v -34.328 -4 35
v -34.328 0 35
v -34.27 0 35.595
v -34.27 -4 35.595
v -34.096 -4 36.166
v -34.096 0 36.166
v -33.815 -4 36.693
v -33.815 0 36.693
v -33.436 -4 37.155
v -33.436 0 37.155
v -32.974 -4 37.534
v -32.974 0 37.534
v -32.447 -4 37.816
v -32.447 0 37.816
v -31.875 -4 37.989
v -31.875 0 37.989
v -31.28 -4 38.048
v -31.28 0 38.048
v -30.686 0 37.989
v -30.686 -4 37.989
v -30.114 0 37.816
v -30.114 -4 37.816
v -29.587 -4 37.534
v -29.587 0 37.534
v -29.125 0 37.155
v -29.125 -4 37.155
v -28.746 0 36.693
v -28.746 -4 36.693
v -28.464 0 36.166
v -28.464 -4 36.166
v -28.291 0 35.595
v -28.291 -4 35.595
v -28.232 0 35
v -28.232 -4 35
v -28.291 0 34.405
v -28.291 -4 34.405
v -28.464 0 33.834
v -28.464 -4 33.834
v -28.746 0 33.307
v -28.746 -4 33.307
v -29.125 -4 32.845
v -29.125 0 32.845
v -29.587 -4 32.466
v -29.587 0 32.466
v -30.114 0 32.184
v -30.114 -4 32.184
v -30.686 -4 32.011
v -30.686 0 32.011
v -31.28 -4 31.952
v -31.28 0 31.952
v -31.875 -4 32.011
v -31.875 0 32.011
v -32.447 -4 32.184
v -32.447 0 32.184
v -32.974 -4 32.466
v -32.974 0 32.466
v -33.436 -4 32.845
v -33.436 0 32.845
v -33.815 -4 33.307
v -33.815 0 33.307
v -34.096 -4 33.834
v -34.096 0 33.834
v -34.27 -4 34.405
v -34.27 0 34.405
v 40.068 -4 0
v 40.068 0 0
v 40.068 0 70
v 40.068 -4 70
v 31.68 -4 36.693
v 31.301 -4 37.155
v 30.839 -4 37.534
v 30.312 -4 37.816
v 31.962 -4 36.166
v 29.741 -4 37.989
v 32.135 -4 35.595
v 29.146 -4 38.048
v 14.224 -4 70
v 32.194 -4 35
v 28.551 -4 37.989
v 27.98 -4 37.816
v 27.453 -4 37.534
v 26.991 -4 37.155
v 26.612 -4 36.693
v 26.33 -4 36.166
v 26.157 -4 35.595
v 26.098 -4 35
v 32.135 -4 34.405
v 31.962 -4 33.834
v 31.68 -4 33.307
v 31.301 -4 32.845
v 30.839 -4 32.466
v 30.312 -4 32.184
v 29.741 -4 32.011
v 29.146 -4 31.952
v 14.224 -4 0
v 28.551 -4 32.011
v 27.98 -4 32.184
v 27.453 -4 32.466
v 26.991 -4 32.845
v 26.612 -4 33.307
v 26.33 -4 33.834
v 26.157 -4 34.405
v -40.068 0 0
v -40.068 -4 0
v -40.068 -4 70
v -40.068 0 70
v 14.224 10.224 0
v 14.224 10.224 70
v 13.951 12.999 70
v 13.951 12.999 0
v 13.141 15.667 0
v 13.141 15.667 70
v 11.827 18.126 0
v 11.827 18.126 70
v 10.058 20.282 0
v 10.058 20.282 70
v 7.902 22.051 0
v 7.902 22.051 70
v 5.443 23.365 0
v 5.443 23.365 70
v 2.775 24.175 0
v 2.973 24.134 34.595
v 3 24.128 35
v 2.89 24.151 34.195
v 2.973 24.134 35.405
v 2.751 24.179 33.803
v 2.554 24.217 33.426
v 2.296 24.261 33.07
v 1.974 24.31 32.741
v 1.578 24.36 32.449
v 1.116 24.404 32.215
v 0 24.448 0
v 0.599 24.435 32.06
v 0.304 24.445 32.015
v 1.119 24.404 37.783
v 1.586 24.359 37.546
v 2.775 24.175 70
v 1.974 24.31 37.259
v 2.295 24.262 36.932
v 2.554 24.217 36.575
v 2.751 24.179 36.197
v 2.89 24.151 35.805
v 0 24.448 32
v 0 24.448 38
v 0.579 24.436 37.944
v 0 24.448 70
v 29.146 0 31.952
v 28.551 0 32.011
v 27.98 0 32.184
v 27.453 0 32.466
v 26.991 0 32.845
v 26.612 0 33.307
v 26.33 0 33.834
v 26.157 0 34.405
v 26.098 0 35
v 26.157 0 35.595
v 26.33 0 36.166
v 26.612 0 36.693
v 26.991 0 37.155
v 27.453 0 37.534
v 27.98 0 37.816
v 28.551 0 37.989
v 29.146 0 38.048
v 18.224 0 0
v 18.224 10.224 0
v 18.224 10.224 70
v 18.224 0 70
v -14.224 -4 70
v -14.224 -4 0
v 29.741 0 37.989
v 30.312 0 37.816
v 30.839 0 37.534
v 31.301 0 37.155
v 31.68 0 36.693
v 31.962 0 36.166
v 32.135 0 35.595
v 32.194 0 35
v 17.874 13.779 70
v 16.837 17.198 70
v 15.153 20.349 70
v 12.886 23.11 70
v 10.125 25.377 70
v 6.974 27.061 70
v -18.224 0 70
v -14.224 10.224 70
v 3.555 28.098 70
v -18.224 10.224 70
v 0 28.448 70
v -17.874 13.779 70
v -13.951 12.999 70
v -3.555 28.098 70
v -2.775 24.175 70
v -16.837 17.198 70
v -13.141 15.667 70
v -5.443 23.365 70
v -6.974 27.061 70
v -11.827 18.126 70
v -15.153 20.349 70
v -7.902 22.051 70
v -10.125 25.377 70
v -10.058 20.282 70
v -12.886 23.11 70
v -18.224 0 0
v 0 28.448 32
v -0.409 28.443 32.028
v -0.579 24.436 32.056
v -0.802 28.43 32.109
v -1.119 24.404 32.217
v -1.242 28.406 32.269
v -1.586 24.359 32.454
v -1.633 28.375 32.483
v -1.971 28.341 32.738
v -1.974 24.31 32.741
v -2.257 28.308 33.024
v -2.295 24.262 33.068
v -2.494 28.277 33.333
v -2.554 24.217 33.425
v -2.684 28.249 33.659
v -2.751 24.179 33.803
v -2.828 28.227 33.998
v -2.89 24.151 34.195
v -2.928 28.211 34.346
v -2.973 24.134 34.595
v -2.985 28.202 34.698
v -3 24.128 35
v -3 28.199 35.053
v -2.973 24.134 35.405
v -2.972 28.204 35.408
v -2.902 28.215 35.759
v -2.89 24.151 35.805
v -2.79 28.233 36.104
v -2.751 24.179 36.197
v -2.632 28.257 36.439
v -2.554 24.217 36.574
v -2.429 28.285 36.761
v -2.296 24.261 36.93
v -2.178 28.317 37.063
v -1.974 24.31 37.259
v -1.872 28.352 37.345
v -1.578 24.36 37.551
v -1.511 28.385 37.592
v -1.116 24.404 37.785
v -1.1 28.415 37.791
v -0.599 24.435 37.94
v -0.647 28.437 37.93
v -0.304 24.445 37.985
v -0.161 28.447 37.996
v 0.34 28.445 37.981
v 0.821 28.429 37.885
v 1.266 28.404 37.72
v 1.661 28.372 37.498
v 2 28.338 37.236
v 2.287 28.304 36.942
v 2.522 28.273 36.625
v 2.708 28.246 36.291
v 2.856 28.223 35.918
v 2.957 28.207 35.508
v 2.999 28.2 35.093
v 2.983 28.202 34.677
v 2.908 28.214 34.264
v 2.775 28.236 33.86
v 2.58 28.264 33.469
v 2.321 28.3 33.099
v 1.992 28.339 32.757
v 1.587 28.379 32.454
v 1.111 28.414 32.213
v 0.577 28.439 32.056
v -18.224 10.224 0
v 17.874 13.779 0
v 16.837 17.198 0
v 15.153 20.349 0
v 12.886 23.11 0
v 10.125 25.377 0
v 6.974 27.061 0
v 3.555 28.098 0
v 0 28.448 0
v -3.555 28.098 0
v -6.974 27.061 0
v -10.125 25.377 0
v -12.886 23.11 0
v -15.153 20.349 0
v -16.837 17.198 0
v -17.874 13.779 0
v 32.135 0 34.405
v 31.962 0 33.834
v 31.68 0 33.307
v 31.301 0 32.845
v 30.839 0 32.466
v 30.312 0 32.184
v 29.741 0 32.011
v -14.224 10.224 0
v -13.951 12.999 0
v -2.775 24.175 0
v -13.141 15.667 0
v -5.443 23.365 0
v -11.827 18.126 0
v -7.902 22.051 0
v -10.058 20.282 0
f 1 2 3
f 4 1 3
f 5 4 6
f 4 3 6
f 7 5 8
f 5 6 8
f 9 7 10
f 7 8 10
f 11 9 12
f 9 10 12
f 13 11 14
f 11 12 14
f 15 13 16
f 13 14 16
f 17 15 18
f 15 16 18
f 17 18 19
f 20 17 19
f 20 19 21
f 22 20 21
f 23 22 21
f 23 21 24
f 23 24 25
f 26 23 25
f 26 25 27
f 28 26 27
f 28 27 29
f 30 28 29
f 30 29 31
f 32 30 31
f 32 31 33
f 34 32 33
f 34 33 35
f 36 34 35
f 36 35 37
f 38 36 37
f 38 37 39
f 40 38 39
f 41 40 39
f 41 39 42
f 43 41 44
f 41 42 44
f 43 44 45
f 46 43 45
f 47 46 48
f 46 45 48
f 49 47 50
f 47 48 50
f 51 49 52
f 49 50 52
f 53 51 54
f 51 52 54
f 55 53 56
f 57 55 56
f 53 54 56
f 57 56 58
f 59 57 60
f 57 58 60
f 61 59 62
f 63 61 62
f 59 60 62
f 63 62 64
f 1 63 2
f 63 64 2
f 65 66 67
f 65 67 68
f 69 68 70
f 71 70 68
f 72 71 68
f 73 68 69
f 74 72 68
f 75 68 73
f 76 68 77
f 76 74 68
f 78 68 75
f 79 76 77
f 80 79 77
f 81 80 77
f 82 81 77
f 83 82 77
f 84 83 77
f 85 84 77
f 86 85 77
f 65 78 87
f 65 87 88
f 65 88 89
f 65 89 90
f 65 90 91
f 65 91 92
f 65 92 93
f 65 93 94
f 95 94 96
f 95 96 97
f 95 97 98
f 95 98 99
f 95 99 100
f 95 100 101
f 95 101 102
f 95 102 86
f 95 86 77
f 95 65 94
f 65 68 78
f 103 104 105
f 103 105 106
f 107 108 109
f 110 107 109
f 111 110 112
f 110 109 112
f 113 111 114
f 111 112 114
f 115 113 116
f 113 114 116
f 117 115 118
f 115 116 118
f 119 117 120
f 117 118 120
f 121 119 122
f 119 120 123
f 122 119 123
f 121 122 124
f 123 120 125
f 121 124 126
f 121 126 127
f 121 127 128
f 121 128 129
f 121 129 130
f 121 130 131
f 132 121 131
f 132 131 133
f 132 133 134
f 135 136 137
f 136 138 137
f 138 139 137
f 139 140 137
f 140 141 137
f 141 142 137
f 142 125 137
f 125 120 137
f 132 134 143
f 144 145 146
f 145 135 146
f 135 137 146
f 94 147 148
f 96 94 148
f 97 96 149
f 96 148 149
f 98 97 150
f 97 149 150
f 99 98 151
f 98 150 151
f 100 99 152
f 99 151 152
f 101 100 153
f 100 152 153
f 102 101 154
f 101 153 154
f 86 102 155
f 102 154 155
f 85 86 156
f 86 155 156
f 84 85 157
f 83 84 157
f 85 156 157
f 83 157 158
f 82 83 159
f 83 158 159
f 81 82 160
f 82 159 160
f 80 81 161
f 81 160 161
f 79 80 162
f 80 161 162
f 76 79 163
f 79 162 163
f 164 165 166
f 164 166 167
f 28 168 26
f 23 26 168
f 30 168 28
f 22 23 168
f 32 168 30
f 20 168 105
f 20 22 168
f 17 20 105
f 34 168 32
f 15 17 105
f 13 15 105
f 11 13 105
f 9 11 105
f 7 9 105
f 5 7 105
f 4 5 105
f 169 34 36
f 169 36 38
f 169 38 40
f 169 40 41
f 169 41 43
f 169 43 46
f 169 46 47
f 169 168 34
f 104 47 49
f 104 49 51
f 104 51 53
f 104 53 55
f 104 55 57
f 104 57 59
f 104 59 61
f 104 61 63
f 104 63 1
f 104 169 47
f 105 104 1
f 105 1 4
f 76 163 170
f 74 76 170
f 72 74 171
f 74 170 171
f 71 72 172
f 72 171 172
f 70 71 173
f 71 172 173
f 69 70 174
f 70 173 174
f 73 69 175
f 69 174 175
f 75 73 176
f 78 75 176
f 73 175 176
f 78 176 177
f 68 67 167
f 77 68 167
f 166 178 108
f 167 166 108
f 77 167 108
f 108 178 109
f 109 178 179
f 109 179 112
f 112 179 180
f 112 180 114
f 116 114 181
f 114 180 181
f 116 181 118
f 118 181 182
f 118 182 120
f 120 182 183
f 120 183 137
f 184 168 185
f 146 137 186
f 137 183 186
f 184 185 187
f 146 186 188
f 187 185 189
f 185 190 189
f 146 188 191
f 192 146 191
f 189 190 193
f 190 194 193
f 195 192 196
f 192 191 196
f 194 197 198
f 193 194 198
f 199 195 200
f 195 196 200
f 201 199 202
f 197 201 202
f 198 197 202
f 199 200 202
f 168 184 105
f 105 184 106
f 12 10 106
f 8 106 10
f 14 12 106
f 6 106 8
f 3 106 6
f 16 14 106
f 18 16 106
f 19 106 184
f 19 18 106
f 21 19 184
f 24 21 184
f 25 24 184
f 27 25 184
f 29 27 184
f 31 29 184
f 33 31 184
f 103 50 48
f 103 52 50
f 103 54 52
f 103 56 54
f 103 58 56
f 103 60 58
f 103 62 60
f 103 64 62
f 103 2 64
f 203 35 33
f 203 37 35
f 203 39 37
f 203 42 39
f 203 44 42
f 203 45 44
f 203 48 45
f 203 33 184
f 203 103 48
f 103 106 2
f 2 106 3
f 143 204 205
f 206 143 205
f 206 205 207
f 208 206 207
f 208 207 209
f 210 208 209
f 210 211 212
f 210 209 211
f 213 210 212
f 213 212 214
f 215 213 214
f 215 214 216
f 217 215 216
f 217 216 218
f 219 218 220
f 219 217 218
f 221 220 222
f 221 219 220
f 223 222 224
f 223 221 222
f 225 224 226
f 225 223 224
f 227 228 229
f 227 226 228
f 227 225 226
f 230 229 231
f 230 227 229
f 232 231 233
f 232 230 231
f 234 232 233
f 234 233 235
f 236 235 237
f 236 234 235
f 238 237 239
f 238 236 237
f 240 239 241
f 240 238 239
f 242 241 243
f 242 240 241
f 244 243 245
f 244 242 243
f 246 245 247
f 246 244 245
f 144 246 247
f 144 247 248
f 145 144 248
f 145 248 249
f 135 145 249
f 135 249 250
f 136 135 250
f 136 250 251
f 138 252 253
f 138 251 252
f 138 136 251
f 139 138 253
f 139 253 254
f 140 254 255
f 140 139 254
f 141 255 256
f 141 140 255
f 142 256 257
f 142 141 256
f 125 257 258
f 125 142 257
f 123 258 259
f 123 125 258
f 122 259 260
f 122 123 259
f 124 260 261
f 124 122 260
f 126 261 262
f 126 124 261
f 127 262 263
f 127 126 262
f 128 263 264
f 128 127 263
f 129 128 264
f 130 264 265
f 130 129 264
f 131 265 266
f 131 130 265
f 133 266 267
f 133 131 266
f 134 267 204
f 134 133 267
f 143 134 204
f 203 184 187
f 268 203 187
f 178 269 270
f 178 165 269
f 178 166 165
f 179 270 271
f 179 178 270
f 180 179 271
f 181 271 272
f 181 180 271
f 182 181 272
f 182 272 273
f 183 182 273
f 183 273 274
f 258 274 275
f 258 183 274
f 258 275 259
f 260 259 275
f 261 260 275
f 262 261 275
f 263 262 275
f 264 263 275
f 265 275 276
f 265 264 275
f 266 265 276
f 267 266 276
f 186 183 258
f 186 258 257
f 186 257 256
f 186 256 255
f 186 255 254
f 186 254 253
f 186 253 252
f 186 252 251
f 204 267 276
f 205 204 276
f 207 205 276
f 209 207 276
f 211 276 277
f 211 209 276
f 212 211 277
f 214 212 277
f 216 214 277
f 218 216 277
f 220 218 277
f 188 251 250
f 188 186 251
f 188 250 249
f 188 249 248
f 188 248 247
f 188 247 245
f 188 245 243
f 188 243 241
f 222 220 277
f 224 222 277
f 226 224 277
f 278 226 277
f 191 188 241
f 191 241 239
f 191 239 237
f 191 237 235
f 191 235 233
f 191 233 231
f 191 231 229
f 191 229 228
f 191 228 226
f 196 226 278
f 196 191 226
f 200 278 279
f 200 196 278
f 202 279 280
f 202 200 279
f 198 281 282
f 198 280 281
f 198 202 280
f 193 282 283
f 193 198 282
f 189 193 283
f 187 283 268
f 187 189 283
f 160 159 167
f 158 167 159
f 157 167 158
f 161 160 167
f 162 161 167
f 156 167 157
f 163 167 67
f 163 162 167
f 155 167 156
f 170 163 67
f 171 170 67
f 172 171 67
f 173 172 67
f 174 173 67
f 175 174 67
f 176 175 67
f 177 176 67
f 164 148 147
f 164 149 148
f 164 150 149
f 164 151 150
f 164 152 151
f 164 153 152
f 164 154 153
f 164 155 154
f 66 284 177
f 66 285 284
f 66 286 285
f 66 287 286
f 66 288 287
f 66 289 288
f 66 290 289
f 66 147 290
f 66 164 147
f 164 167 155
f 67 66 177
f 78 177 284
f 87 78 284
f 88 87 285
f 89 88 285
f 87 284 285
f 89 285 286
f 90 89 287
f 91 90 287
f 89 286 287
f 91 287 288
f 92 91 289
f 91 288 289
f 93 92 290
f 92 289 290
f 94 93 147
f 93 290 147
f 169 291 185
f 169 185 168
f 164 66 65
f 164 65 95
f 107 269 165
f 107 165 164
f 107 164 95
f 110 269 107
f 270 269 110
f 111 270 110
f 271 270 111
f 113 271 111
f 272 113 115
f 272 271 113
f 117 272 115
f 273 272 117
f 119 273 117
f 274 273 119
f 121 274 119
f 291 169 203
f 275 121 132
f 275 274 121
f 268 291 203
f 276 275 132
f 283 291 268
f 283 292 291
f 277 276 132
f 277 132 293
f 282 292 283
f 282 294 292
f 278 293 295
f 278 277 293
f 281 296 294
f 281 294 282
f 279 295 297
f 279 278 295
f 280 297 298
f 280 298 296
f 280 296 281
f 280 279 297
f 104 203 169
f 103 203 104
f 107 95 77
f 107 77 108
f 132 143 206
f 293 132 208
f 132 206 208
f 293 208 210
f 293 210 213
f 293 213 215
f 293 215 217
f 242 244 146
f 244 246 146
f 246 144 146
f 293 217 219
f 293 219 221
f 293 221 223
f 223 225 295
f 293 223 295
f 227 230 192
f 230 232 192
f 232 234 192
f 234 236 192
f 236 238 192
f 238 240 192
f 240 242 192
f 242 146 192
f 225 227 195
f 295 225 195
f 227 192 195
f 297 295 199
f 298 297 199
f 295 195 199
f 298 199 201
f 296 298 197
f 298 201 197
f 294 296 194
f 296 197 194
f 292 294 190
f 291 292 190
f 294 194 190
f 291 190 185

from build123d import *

# Parameters (mm, degrees)
BOSS_EXTRUDE1_DEPTH = 70
SKETCH2_R           = 3.048
CUT_EXTRUDE1_DEPTH  = 70
FILLET1_R           = 14.224
FILLET2_RADIUS      = 18.224
FILLET2_LENGTH      = 70
SKETCH3_R           = 3
CUT_EXTRUDE2_DEPTH  = 70


with BuildPart() as part:
    # Sketch1 → Boss-Extrude1 (new body)
    with BuildSketch(Plane.XY):
        Polygon((-40.068, 0), (-18.224, 0), (-18.224, 28.448), (18.224, 28.448), (18.224, 0), (40.068, 0), (40.068, -4), (14.224, -4), (14.224, 24.448), (-14.224, 24.448), (-14.224, -4), (-40.068, -4), align=None)
    extrude(amount=BOSS_EXTRUDE1_DEPTH)

    # Sketch2 → Cut-Extrude1 (cut)
    with BuildSketch(Plane(origin=(0, 0, 0), x_dir=(1, 0, 0), z_dir=(0, 1, 0))):
        with Locations(Location((-31.280253866, -35, 0), (0, 0, 180))):
            Circle(SKETCH2_R)
        with BuildLine():
            ThreePointArc((32.194, -35), (31.301261469, -32.844738531), (29.146, -31.952))
            Line((29.146, -31.952), (29.146, -38.048))
            ThreePointArc((29.146, -38.048), (31.301261469, -37.155261469), (32.194, -35))
        make_face()
        with BuildLine():
            Line((29.146, -38.048), (29.146, -31.952))
            ThreePointArc((29.146, -31.952), (26.098, -35), (29.146, -38.048))
        make_face()
    extrude(amount=-CUT_EXTRUDE1_DEPTH, mode=Mode.SUBTRACT)

    # Fillet1
    fillet1_edges = [part.edges().sort_by_distance(p)[0] for p in [
        (14.224, 24.448, 35),
        (-14.224, 24.448, 35),
    ]]
    fillet(fillet1_edges, radius=FILLET1_R - 0.0001)  # a hair under: the kernel refuses the full size

    # Fillet2: full round fillet: the end face becomes a half cylinder, R = half its width
    fillet2_face = Plane((0, 28.448, 35), x_dir=(0, 0, 1), z_dir=(0, 1, 0))  # on the end face: x along it, z out of the body
    fillet2_slab = fillet2_face.offset(-FILLET2_RADIUS / 2) * Box(FILLET2_LENGTH, 2 * FILLET2_RADIUS, FILLET2_RADIUS, mode=Mode.PRIVATE)  # the body's end, R deep
    fillet2_round = Plane((0, 10.224, 35), x_dir=(0, 1, 0), z_dir=(0, 0, 1)) * Cylinder(FILLET2_RADIUS, FILLET2_LENGTH, mode=Mode.PRIVATE)  # its axis R under the face
    add(fillet2_slab - fillet2_round, mode=Mode.SUBTRACT)

    # Sketch3 → Cut-Extrude2 (cut)
    with BuildSketch(Plane(origin=(0, 0, 0), x_dir=(1, 0, 0), z_dir=(0, 1, 0))):
        with Locations(Location((0, -35, 0), (0, 0, 90))):
            Circle(SKETCH3_R)
    extrude(amount=CUT_EXTRUDE2_DEPTH, mode=Mode.SUBTRACT)


solid = part.part
